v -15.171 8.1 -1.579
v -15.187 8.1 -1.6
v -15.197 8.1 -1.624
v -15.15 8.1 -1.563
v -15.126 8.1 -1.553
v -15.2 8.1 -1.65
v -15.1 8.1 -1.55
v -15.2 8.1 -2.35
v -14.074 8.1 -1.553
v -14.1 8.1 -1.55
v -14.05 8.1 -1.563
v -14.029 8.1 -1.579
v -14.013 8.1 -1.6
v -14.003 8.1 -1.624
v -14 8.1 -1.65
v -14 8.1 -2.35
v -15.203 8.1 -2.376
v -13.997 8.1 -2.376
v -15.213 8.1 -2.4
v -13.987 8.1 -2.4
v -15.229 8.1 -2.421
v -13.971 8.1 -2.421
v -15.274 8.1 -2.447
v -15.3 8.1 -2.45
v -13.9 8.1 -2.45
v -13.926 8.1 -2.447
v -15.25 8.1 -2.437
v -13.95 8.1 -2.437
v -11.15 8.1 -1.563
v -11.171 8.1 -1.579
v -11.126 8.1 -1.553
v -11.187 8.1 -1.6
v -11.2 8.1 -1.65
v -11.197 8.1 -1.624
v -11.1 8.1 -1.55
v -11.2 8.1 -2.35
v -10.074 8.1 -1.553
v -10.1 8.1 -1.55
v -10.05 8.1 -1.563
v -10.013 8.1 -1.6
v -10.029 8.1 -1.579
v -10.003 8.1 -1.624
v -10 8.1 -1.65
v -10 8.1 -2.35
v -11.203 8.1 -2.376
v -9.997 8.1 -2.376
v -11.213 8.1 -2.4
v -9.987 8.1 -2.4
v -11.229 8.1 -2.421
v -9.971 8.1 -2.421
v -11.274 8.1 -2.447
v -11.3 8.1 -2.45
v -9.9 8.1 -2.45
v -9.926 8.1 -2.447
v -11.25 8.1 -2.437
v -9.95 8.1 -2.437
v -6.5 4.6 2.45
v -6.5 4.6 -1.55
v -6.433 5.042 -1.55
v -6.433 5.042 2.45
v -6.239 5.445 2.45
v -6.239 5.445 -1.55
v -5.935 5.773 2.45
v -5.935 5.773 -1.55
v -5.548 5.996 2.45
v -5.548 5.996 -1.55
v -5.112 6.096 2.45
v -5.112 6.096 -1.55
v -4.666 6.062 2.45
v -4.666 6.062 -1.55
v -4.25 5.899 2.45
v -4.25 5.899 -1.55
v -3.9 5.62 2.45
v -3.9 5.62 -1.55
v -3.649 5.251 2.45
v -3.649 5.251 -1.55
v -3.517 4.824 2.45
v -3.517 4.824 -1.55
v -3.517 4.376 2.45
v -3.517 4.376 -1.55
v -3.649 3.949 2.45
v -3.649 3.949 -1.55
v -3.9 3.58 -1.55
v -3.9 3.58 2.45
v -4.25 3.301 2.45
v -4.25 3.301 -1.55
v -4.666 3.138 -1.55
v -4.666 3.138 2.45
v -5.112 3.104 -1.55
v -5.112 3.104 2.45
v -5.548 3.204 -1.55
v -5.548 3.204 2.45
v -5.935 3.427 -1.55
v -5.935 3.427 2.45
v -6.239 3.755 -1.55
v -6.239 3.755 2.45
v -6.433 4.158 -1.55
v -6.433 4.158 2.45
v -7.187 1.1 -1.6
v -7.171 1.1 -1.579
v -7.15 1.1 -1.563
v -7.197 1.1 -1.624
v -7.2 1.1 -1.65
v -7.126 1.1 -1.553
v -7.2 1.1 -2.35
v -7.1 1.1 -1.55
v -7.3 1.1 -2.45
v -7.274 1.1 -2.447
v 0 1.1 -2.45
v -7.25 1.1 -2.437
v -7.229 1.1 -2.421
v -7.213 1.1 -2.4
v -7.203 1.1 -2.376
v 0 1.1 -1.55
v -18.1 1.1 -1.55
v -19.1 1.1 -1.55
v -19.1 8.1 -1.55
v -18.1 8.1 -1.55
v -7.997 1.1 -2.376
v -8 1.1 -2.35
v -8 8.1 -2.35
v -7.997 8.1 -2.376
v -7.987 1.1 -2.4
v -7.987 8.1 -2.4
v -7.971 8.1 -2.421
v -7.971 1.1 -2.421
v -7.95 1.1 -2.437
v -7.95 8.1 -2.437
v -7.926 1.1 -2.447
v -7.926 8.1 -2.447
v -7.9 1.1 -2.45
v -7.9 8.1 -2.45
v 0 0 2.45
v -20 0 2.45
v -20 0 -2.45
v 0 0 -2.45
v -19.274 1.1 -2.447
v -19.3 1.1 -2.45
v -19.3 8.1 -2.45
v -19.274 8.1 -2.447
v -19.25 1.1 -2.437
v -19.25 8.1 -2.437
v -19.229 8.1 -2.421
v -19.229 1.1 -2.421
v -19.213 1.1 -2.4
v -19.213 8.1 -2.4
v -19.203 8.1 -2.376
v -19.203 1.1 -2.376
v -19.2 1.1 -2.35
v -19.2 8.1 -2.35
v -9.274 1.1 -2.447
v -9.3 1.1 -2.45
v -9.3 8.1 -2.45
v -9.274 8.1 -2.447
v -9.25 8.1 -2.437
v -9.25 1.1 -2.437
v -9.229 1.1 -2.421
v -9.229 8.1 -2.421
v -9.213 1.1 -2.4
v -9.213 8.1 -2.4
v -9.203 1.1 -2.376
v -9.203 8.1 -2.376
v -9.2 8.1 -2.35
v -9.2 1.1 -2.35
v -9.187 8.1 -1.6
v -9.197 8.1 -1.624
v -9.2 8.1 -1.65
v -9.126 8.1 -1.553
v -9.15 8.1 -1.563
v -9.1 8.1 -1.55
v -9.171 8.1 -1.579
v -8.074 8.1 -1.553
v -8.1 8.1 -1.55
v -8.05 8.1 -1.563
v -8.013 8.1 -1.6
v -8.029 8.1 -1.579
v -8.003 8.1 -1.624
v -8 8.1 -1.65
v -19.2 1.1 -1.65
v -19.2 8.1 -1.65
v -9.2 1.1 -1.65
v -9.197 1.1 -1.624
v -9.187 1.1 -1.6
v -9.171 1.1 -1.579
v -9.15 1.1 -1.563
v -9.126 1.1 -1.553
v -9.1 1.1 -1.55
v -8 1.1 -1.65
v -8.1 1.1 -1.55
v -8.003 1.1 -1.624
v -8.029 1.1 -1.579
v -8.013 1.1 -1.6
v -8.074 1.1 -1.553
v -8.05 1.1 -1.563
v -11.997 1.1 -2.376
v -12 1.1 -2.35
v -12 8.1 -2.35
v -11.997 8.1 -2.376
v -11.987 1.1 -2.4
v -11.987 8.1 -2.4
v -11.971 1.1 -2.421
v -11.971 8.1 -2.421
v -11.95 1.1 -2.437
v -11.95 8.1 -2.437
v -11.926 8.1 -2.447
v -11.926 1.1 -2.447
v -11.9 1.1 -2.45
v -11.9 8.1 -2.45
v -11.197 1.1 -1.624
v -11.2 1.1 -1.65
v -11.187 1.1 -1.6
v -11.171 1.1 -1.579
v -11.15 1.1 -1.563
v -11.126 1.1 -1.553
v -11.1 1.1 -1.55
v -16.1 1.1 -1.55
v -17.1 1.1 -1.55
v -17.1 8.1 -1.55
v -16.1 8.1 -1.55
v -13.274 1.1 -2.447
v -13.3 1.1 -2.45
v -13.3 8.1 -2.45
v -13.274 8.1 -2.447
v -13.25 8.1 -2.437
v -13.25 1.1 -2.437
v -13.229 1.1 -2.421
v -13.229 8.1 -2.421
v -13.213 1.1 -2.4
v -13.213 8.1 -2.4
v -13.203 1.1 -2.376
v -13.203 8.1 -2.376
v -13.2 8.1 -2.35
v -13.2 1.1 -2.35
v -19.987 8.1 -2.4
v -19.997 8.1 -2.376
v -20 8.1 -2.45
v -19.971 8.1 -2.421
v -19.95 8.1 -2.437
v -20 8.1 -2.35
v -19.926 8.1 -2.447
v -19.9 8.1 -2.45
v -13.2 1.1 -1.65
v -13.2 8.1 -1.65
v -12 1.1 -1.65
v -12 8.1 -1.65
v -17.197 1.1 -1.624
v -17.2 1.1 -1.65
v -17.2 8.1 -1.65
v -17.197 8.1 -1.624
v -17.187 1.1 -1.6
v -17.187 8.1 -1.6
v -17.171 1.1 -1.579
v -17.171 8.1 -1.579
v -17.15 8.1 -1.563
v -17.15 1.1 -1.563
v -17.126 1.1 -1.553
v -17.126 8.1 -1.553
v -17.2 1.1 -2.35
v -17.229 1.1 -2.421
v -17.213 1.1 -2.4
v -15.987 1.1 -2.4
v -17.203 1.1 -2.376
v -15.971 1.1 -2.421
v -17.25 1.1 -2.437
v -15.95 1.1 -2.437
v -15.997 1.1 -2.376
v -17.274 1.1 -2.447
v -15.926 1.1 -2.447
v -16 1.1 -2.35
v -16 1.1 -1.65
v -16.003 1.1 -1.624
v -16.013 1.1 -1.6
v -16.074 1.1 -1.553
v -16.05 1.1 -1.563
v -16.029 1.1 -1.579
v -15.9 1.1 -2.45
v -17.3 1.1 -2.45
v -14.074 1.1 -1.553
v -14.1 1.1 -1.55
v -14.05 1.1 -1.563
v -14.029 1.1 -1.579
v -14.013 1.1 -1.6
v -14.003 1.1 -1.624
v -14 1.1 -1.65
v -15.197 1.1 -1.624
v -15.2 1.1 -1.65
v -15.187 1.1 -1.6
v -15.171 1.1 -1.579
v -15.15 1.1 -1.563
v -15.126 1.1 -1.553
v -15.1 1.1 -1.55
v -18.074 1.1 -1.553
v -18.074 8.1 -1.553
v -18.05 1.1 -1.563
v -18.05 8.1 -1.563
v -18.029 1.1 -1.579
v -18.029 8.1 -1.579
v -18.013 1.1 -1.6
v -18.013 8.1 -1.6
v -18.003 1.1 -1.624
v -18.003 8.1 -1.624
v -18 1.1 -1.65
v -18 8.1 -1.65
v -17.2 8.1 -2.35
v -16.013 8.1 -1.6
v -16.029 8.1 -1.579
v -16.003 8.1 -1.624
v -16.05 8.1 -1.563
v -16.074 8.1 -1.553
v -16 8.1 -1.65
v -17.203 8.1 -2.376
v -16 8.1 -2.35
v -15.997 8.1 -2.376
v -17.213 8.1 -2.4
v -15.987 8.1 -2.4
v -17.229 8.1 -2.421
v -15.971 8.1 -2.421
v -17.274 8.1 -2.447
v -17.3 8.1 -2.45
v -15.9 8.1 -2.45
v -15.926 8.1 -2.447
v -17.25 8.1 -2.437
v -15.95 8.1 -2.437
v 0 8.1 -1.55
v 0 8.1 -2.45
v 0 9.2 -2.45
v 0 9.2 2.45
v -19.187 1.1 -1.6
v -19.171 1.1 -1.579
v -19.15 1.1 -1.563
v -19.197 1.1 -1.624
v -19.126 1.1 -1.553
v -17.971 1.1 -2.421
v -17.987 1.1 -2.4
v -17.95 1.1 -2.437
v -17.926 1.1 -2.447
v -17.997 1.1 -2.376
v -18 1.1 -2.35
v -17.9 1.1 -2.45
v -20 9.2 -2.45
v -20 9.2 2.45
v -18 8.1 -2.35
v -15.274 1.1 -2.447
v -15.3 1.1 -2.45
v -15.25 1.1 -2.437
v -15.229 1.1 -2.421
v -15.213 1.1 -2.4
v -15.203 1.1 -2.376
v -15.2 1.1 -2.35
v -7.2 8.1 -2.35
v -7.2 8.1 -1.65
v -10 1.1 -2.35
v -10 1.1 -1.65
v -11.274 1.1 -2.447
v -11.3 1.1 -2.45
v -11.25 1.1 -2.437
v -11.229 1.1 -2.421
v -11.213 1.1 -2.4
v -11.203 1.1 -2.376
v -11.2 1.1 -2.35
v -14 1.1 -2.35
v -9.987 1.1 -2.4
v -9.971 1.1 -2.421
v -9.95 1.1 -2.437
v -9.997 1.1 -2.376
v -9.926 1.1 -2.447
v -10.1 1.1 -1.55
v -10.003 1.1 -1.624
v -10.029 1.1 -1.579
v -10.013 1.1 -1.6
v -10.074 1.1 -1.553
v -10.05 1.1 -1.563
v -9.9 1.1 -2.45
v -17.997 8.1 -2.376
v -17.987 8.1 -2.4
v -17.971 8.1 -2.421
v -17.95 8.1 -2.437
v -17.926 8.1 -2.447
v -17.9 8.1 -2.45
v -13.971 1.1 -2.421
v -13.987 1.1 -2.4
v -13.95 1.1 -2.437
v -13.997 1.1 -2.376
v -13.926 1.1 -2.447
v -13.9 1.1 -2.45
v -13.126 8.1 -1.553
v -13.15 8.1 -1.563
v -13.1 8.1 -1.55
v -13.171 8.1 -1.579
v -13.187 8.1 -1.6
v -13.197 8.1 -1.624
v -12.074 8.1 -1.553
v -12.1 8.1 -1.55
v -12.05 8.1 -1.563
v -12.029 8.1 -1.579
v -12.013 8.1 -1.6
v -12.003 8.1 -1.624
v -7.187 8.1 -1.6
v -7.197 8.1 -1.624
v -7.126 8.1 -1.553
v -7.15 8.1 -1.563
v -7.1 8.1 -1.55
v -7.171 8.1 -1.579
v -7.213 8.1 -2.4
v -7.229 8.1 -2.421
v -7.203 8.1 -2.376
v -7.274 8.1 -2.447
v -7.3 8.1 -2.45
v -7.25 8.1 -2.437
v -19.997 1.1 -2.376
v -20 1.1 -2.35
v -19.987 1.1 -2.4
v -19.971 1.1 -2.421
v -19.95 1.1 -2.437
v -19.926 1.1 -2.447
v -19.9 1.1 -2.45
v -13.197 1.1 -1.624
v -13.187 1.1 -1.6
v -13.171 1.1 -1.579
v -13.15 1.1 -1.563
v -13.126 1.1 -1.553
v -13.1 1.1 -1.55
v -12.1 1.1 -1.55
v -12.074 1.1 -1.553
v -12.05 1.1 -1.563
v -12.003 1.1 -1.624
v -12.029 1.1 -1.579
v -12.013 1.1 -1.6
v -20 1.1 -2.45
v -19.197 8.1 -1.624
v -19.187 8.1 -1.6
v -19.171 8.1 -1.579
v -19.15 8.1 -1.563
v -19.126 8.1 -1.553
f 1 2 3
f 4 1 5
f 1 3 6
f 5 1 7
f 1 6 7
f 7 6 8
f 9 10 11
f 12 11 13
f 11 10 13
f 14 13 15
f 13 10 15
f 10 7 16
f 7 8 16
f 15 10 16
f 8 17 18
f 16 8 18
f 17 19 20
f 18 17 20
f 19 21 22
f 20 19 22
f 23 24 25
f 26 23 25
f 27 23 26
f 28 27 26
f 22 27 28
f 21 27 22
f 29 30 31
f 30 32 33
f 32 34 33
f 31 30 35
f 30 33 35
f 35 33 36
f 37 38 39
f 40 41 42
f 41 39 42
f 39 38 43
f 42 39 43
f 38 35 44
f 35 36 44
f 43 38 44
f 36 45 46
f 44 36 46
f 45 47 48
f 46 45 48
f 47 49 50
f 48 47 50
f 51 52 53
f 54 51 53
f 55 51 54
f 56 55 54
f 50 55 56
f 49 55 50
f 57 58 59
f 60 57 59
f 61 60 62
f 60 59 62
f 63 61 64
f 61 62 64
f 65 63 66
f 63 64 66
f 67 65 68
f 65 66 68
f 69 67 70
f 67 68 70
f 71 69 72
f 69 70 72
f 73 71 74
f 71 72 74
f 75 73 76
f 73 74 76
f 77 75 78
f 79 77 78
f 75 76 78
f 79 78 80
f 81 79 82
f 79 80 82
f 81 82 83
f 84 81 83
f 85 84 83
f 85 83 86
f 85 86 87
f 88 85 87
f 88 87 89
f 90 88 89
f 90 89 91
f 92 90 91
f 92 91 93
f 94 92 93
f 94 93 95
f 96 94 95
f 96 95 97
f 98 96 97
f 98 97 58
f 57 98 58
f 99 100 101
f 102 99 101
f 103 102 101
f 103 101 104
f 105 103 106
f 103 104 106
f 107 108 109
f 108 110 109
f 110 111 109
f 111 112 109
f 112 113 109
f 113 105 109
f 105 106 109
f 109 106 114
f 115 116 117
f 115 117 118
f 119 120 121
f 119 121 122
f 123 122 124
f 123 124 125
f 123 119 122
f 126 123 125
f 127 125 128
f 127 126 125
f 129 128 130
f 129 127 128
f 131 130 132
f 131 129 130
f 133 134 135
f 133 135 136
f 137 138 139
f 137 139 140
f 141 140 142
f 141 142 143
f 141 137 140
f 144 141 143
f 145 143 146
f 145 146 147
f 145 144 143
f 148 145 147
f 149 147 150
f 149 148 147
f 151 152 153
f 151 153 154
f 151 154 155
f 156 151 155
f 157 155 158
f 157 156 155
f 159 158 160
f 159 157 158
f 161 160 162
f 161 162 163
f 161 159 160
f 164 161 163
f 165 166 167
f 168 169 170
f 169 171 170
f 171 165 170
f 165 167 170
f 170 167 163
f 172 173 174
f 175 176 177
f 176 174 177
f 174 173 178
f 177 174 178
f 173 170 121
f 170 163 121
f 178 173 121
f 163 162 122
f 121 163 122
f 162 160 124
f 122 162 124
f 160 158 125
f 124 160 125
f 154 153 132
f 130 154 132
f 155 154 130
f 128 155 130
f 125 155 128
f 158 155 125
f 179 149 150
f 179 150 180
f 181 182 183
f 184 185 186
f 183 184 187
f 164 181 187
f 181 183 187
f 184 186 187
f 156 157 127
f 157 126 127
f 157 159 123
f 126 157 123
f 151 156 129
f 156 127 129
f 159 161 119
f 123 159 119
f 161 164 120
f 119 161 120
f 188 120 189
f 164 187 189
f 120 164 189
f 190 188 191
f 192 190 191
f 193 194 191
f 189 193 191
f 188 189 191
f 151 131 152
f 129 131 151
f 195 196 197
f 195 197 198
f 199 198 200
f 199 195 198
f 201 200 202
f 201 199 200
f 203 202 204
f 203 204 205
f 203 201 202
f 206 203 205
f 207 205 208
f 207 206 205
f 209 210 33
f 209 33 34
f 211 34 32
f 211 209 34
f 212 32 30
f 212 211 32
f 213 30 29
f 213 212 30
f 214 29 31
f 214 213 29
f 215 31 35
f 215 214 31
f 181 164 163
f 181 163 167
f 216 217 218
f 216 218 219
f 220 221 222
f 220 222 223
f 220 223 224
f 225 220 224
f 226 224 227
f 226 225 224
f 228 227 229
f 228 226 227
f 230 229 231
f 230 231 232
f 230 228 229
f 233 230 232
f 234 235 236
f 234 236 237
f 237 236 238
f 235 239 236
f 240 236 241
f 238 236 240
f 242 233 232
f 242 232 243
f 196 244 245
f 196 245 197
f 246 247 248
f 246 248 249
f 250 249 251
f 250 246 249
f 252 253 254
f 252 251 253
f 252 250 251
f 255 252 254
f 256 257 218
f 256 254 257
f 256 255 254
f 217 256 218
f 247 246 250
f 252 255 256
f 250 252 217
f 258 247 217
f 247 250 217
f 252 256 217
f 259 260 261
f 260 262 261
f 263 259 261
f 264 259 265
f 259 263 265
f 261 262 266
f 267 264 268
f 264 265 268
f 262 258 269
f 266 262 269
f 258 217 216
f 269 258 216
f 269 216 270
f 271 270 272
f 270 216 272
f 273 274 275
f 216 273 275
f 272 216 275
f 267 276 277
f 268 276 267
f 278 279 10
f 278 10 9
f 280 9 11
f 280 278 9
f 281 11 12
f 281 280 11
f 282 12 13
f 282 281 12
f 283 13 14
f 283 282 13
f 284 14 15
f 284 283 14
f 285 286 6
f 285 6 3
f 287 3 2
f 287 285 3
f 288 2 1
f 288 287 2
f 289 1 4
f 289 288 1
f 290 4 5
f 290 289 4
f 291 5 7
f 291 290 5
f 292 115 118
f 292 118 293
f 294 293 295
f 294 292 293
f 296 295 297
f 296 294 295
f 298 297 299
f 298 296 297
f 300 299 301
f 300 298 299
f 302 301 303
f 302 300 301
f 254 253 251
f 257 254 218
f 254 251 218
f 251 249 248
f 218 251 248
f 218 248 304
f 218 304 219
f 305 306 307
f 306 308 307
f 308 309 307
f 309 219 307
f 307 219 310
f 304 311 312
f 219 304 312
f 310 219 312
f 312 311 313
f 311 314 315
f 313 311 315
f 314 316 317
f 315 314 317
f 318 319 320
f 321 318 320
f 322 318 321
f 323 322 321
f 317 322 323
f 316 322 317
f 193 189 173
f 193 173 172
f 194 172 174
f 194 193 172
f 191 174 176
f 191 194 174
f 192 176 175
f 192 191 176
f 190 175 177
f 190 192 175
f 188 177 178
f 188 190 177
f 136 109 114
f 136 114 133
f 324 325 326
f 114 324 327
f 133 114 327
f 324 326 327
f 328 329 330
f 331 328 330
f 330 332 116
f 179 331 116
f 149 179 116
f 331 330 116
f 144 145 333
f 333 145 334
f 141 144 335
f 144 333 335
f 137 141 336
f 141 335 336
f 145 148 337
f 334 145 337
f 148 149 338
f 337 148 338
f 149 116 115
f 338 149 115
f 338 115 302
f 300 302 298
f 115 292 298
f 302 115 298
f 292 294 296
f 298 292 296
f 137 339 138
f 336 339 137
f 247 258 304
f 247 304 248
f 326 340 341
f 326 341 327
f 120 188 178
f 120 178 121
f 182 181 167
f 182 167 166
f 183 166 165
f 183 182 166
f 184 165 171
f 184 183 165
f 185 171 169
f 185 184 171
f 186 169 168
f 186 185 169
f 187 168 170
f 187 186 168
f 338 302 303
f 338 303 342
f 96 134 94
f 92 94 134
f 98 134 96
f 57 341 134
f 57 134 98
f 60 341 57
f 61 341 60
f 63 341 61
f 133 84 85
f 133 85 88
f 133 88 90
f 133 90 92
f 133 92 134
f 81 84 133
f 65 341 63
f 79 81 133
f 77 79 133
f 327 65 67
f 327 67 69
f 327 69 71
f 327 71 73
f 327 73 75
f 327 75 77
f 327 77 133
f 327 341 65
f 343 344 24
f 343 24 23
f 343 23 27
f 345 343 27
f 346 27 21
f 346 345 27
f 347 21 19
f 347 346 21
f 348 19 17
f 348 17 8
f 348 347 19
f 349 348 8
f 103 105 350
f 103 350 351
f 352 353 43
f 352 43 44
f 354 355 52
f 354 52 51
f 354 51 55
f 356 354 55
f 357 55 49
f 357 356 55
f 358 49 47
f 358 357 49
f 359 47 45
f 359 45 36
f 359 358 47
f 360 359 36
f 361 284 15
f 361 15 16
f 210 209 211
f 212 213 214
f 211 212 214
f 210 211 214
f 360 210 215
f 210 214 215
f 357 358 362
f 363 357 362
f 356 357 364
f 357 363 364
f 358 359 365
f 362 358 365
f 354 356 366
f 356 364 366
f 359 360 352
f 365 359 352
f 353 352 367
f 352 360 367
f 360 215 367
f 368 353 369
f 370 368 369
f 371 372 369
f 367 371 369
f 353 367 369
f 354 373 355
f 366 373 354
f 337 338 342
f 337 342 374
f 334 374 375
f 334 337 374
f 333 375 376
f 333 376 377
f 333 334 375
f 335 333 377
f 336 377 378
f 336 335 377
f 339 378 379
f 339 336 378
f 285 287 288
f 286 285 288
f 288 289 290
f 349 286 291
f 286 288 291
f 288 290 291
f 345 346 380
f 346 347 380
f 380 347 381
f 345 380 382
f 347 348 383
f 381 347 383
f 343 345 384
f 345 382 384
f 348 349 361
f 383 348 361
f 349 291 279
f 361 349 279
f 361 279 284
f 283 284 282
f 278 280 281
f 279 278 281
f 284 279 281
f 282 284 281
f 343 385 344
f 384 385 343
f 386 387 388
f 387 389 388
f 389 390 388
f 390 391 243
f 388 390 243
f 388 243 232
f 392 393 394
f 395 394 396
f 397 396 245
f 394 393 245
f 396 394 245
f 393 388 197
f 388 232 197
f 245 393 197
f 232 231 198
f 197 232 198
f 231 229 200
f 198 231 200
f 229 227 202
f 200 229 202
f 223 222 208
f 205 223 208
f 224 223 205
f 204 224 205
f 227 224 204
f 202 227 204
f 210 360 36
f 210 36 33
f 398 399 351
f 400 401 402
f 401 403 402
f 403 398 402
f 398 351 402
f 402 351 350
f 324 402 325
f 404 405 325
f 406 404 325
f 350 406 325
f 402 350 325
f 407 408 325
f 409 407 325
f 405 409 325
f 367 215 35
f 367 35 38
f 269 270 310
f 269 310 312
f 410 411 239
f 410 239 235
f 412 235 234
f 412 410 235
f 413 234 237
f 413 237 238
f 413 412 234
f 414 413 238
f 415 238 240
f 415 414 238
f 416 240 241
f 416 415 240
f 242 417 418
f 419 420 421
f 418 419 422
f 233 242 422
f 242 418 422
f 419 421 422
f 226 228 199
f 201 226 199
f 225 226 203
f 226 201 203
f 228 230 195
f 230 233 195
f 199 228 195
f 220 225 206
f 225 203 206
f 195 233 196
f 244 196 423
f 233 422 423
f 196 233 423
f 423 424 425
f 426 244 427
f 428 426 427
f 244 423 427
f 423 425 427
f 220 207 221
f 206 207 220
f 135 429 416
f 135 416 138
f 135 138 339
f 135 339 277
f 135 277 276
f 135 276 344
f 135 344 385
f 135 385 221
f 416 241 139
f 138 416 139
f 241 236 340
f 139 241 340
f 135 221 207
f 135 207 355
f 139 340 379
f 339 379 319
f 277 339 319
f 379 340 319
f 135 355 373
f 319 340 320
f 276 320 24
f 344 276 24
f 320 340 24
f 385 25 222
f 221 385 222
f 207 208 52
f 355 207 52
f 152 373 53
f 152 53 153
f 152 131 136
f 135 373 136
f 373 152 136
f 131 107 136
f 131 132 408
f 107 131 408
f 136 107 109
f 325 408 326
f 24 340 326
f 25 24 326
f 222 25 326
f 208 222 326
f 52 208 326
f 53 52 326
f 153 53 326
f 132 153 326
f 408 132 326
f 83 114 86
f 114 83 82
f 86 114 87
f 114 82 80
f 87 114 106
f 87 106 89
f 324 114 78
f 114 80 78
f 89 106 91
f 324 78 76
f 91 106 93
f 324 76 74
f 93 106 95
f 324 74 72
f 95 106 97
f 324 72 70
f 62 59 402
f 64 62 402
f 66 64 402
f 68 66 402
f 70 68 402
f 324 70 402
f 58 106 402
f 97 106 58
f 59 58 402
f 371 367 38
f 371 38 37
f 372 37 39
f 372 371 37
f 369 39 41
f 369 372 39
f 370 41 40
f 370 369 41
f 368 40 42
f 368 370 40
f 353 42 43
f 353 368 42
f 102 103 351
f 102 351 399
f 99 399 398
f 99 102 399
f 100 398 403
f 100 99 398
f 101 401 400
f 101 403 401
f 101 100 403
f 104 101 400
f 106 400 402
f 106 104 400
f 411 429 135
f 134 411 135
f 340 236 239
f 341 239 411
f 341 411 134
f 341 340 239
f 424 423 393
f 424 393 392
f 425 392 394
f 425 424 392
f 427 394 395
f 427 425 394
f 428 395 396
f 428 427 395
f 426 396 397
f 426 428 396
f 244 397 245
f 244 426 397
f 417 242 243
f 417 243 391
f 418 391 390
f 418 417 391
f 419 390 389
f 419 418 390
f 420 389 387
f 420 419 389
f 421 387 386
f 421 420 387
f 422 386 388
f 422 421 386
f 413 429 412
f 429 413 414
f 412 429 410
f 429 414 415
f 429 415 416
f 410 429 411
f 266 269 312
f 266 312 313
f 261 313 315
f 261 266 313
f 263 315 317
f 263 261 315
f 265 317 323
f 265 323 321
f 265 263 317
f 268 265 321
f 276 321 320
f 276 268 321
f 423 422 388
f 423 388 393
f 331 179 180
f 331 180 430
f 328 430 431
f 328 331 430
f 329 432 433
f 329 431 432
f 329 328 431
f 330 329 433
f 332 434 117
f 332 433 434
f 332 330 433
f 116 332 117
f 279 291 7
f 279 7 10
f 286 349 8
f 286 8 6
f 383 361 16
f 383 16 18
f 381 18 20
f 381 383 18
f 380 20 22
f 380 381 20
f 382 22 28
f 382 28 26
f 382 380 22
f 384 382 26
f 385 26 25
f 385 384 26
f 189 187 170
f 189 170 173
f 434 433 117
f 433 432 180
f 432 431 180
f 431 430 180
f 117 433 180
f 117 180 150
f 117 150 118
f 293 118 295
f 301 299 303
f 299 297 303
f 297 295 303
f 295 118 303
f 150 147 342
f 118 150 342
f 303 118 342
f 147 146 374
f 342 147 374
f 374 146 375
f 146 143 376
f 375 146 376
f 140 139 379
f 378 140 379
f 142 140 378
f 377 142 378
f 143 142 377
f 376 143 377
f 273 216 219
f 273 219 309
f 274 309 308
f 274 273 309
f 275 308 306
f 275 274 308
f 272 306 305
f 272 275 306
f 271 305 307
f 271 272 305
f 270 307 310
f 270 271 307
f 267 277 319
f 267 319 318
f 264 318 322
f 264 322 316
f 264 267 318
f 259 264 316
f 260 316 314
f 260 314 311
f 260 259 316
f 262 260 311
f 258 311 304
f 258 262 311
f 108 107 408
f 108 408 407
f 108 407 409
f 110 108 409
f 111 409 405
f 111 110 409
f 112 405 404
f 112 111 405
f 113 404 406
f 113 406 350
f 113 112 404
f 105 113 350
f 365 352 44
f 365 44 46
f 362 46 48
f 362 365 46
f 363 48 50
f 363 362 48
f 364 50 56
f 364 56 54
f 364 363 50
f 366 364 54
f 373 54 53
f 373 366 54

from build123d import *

# Parameters (mm, degrees)
RESSALTO_EXTRUS_O2_DEPTH = 9.2
ESBO_O5_R                = 2.15
CORTE_EXTRUS_O2_DEPTH    = 9.2
CHANFRO2_SIZE            = 0.3
SKETCH1_W                = 12.014068267
SKETCH1_H                = 17.223276929
CUT_EXTRUDE1_DEPTH       = 25
SKETCH3_W                = 4
SKETCH3_H                = 9.2
BOSS_EXTRUDE1_DEPTH      = 5
SKETCH4_R                = 1.5
CUT_EXTRUDE3_DEPTH       = 10
SKETCH5_W                = 42.60578415
SKETCH5_H                = 33.509789151
CUT_EXTRUDE4_DEPTH       = 1.1
SKETCH6_W                = 58.176505701
SKETCH6_H                = 25.888094607
CUT_EXTRUDE5_DEPTH       = 1.1
SKETCH7_W                = 20
SKETCH7_H                = 4.9
BOSS_EXTRUDE2_DEPTH      = 1.1
SKETCH8_W                = 20
SKETCH8_H                = 4.9
BOSS_EXTRUDE3_DEPTH      = 1.1


with BuildPart() as part:
    # Esboço4 → Ressalto-extrusão2 (new body)
    with BuildSketch(Plane(origin=(0, 0, 0), x_dir=(1, 0, 0), z_dir=(0, 1, 0))):
        with BuildLine():
            Line((-19.2, 2.35), (-19.2, 1.65))
            ThreePointArc((-19.2, 1.65), (-19.170710678, 1.579289322), (-19.1, 1.55))
            Line((-19.1, 1.55), (-18.1, 1.55))
            ThreePointArc((-18.1, 1.55), (-18.029289322, 1.579289322), (-18, 1.65))
            Line((-18, 1.65), (-18, 2.35))
            ThreePointArc((-18, 2.35), (-17.970710678, 2.420710678), (-17.9, 2.45))
            Line((-17.9, 2.45), (-17.3, 2.45))
            ThreePointArc((-17.3, 2.45), (-17.229289322, 2.420710678), (-17.2, 2.35))
            Line((-17.2, 2.35), (-17.2, 1.65))
            ThreePointArc((-17.2, 1.65), (-17.170710678, 1.579289322), (-17.1, 1.55))
            Line((-17.1, 1.55), (-16.1, 1.55))
            ThreePointArc((-16.1, 1.55), (-16.029289322, 1.579289322), (-16, 1.65))
            Line((-16, 1.65), (-16, 2.35))
            ThreePointArc((-16, 2.35), (-15.970710678, 2.420710678), (-15.9, 2.45))
            Line((-15.9, 2.45), (-15.3, 2.45))
            ThreePointArc((-15.3, 2.45), (-15.229289322, 2.420710678), (-15.2, 2.35))
            Line((-15.2, 2.35), (-15.2, 1.65))
            ThreePointArc((-15.2, 1.65), (-15.170710678, 1.579289322), (-15.1, 1.55))
            Line((-15.1, 1.55), (-14.1, 1.55))
            ThreePointArc((-14.1, 1.55), (-14.029289322, 1.579289322), (-14, 1.65))
            Line((-14, 1.65), (-14, 2.35))
            ThreePointArc((-14, 2.35), (-13.970710678, 2.420710678), (-13.9, 2.45))
            Line((-13.9, 2.45), (-13.3, 2.45))
            ThreePointArc((-13.3, 2.45), (-13.229289322, 2.420710678), (-13.2, 2.35))
            Line((-13.2, 2.35), (-13.2, 1.65))
            ThreePointArc((-13.2, 1.65), (-13.170710678, 1.579289322), (-13.1, 1.55))
            Line((-13.1, 1.55), (-12.1, 1.55))
            ThreePointArc((-12.1, 1.55), (-12.029289322, 1.579289322), (-12, 1.65))
            Line((-12, 1.65), (-12, 2.35))
            ThreePointArc((-12, 2.35), (-11.970710678, 2.420710678), (-11.9, 2.45))
            Line((-11.9, 2.45), (-11.3, 2.45))
            ThreePointArc((-11.3, 2.45), (-11.229289322, 2.420710678), (-11.2, 2.35))
            Line((-11.2, 2.35), (-11.2, 1.65))
            ThreePointArc((-11.2, 1.65), (-11.170710678, 1.579289322), (-11.1, 1.55))
            Line((-11.1, 1.55), (-10.1, 1.55))
            ThreePointArc((-10.1, 1.55), (-10.029289322, 1.579289322), (-10, 1.65))
            Line((-10, 1.65), (-10, 2.35))
            ThreePointArc((-10, 2.35), (-9.970710678, 2.420710678), (-9.9, 2.45))
            Line((-9.9, 2.45), (-9.3, 2.45))
            ThreePointArc((-9.3, 2.45), (-9.229289322, 2.420710678), (-9.2, 2.35))
            Line((-9.2, 2.35), (-9.2, 1.65))
            ThreePointArc((-9.2, 1.65), (-9.170710678, 1.579289322), (-9.1, 1.55))
            Line((-9.1, 1.55), (-8.1, 1.55))
            ThreePointArc((-8.1, 1.55), (-8.029289322, 1.579289322), (-8, 1.65))
            Line((-8, 1.65), (-8, 2.35))
            ThreePointArc((-8, 2.35), (-7.970710678, 2.420710678), (-7.9, 2.45))
            Line((-7.9, 2.45), (-7.3, 2.45))
            ThreePointArc((-7.3, 2.45), (-7.229289322, 2.420710678), (-7.2, 2.35))
            Line((-7.2, 2.35), (-7.2, 1.65))
            ThreePointArc((-7.2, 1.65), (-7.170710678, 1.579289322), (-7.1, 1.55))
            Line((-7.1, 1.55), (7.1, 1.55))
            ThreePointArc((7.1, 1.55), (7.170710678, 1.579289322), (7.2, 1.65))
            Line((7.2, 1.65), (7.2, 2.35))
            ThreePointArc((7.2, 2.35), (7.229289322, 2.420710678), (7.3, 2.45))
            Line((7.3, 2.45), (7.9, 2.45))
            ThreePointArc((7.9, 2.45), (7.970710678, 2.420710678), (8, 2.35))
            Line((8, 2.35), (8, 1.65))
            ThreePointArc((8, 1.65), (8.029289322, 1.579289322), (8.1, 1.55))
            Line((8.1, 1.55), (9.1, 1.55))
            ThreePointArc((9.1, 1.55), (9.170710678, 1.579289322), (9.2, 1.65))
            Line((9.2, 1.65), (9.2, 2.35))
            ThreePointArc((9.2, 2.35), (9.229289322, 2.420710678), (9.3, 2.45))
            Line((9.3, 2.45), (9.9, 2.45))
            ThreePointArc((9.9, 2.45), (9.970710678, 2.420710678), (10, 2.35))
            Line((10, 2.35), (10, 1.65))
            ThreePointArc((10, 1.65), (10.029289322, 1.579289322), (10.1, 1.55))
            Line((10.1, 1.55), (11.1, 1.55))
            ThreePointArc((11.1, 1.55), (11.170710678, 1.579289322), (11.2, 1.65))
            Line((11.2, 1.65), (11.2, 2.35))
            ThreePointArc((11.2, 2.35), (11.229289322, 2.420710678), (11.3, 2.45))
            Line((11.3, 2.45), (11.9, 2.45))
            ThreePointArc((11.9, 2.45), (11.970710678, 2.420710678), (12, 2.35))
            Line((12, 2.35), (12, 1.65))
            ThreePointArc((12, 1.65), (12.029289322, 1.579289322), (12.1, 1.55))
            Line((12.1, 1.55), (13.1, 1.55))
            ThreePointArc((13.1, 1.55), (13.170710678, 1.579289322), (13.2, 1.65))
            Line((13.2, 1.65), (13.2, 2.35))
            ThreePointArc((13.2, 2.35), (13.229289322, 2.420710678), (13.3, 2.45))
            Line((13.3, 2.45), (13.9, 2.45))
            ThreePointArc((13.9, 2.45), (13.970710678, 2.420710678), (14, 2.35))
            Line((14, 2.35), (14, 1.65))
            ThreePointArc((14, 1.65), (14.029289322, 1.579289322), (14.1, 1.55))
            Line((14.1, 1.55), (15.1, 1.55))
            ThreePointArc((15.1, 1.55), (15.170710678, 1.579289322), (15.2, 1.65))
            Line((15.2, 1.65), (15.2, 2.35))
            ThreePointArc((15.2, 2.35), (15.229289322, 2.420710678), (15.3, 2.45))
            Line((15.3, 2.45), (15.9, 2.45))
            ThreePointArc((15.9, 2.45), (15.970710678, 2.420710678), (16, 2.35))
            Line((16, 2.35), (16, 1.65))
            ThreePointArc((16, 1.65), (16.029289322, 1.579289322), (16.1, 1.55))
            Line((16.1, 1.55), (17.1, 1.55))
            ThreePointArc((17.1, 1.55), (17.170710678, 1.579289322), (17.2, 1.65))
            Line((17.2, 1.65), (17.2, 2.35))
            ThreePointArc((17.2, 2.35), (17.229289322, 2.420710678), (17.3, 2.45))
            Line((17.3, 2.45), (17.9, 2.45))
            ThreePointArc((17.9, 2.45), (17.970710678, 2.420710678), (18, 2.35))
            Line((18, 2.35), (18, 1.65))
            ThreePointArc((18, 1.65), (18.029289322, 1.579289322), (18.1, 1.55))
            Line((18.1, 1.55), (19.1, 1.55))
            ThreePointArc((19.1, 1.55), (19.170710678, 1.579289322), (19.2, 1.65))
            Line((19.2, 1.65), (19.2, 2.35))
            ThreePointArc((19.2, 2.35), (19.229289322, 2.420710678), (19.3, 2.45))
            Line((19.3, 2.45), (19.9, 2.45))
            ThreePointArc((19.9, 2.45), (19.970710678, 2.420710678), (20, 2.35))
            Line((20, 2.35), (20, -2.45))
            Line((20, -2.45), (-20, -2.45))
            Line((-20, -2.45), (-20, 2.35))
            ThreePointArc((-20, 2.35), (-19.970710678, 2.420710678), (-19.9, 2.45))
            Line((-19.9, 2.45), (-19.3, 2.45))
            ThreePointArc((-19.3, 2.45), (-19.229289322, 2.420710678), (-19.2, 2.35))
        make_face()
    extrude(amount=RESSALTO_EXTRUS_O2_DEPTH)

    # Esboço5 → Corte-extrusão2 (cut)
    with BuildSketch(Plane(origin=(0, 0, -1.55), x_dir=(-1, 0, 0), z_dir=(0, 0, -1))):
        with Locations((0, 4.6)):
            Circle(ESBO_O5_R)
    extrude(amount=-CORTE_EXTRUS_O2_DEPTH, mode=Mode.SUBTRACT)

    # Chanfro2
    chanfro2_edges = [part.edges().sort_by_distance(p)[0] for p in [
        (2.15, 4.6, -1.55),
    ]]
    chamfer(chanfro2_edges, length=CHANFRO2_SIZE)

    # Sketch1 → Cut-Extrude1 (cut)
    with BuildSketch(Plane(origin=(20, 0, 0), x_dir=(0, 0, -1), z_dir=(1, 0, 0))):
        with Locations((-0.254525551, 3.53223116)):
            Rectangle(SKETCH1_W, SKETCH1_H)
    extrude(amount=-CUT_EXTRUDE1_DEPTH, mode=Mode.SUBTRACT)

    # Sketch3 → Boss-Extrude1 (add)
    with BuildSketch(Plane(origin=(-5, 0, 0), x_dir=(0, 0, -1), z_dir=(1, 0, 0))):
        with Locations((-0.45, 4.6)):
            Rectangle(SKETCH3_W, SKETCH3_H)
    extrude(amount=BOSS_EXTRUDE1_DEPTH)

    # Sketch4 → Cut-Extrude3 (cut)
    with BuildSketch(Plane(origin=(0, 0, -1.55), x_dir=(-1, 0, 0), z_dir=(0, 0, -1))):
        with Locations((5, 4.6)):
            Circle(SKETCH4_R)
    extrude(amount=-CUT_EXTRUDE3_DEPTH, mode=Mode.SUBTRACT)

    # Sketch5 → Cut-Extrude4 (cut)
    with BuildSketch(Plane.XZ):
        with Locations((-12.27909741, -6.492410197)):
            Rectangle(SKETCH5_W, SKETCH5_H)
    extrude(amount=-CUT_EXTRUDE4_DEPTH, mode=Mode.SUBTRACT)

    # Sketch6 → Cut-Extrude5 (cut)
    with BuildSketch(Plane(origin=(0, 9.2, 0), x_dir=(1, 0, 0), z_dir=(0, 1, 0))):
        with Locations((-5.279993837, 3.701095613)):
            Rectangle(SKETCH6_W, SKETCH6_H)
    extrude(amount=-CUT_EXTRUDE5_DEPTH, mode=Mode.SUBTRACT)

    # Sketch7 → Boss-Extrude2 (add)
    with BuildSketch(Plane(origin=(0, 8.1, 0), x_dir=(1, 0, 0), z_dir=(0, 1, 0))):
        with Locations((-10, 0)):
            Rectangle(SKETCH7_W, SKETCH7_H)
    extrude(amount=BOSS_EXTRUDE2_DEPTH)

    # Sketch8 → Boss-Extrude3 (add)
    with BuildSketch(Plane.XZ.offset(-1.1)):
        with Locations((-10, 0)):
            Rectangle(SKETCH8_W, SKETCH8_H)
    extrude(amount=BOSS_EXTRUDE3_DEPTH)


solid = part.part
